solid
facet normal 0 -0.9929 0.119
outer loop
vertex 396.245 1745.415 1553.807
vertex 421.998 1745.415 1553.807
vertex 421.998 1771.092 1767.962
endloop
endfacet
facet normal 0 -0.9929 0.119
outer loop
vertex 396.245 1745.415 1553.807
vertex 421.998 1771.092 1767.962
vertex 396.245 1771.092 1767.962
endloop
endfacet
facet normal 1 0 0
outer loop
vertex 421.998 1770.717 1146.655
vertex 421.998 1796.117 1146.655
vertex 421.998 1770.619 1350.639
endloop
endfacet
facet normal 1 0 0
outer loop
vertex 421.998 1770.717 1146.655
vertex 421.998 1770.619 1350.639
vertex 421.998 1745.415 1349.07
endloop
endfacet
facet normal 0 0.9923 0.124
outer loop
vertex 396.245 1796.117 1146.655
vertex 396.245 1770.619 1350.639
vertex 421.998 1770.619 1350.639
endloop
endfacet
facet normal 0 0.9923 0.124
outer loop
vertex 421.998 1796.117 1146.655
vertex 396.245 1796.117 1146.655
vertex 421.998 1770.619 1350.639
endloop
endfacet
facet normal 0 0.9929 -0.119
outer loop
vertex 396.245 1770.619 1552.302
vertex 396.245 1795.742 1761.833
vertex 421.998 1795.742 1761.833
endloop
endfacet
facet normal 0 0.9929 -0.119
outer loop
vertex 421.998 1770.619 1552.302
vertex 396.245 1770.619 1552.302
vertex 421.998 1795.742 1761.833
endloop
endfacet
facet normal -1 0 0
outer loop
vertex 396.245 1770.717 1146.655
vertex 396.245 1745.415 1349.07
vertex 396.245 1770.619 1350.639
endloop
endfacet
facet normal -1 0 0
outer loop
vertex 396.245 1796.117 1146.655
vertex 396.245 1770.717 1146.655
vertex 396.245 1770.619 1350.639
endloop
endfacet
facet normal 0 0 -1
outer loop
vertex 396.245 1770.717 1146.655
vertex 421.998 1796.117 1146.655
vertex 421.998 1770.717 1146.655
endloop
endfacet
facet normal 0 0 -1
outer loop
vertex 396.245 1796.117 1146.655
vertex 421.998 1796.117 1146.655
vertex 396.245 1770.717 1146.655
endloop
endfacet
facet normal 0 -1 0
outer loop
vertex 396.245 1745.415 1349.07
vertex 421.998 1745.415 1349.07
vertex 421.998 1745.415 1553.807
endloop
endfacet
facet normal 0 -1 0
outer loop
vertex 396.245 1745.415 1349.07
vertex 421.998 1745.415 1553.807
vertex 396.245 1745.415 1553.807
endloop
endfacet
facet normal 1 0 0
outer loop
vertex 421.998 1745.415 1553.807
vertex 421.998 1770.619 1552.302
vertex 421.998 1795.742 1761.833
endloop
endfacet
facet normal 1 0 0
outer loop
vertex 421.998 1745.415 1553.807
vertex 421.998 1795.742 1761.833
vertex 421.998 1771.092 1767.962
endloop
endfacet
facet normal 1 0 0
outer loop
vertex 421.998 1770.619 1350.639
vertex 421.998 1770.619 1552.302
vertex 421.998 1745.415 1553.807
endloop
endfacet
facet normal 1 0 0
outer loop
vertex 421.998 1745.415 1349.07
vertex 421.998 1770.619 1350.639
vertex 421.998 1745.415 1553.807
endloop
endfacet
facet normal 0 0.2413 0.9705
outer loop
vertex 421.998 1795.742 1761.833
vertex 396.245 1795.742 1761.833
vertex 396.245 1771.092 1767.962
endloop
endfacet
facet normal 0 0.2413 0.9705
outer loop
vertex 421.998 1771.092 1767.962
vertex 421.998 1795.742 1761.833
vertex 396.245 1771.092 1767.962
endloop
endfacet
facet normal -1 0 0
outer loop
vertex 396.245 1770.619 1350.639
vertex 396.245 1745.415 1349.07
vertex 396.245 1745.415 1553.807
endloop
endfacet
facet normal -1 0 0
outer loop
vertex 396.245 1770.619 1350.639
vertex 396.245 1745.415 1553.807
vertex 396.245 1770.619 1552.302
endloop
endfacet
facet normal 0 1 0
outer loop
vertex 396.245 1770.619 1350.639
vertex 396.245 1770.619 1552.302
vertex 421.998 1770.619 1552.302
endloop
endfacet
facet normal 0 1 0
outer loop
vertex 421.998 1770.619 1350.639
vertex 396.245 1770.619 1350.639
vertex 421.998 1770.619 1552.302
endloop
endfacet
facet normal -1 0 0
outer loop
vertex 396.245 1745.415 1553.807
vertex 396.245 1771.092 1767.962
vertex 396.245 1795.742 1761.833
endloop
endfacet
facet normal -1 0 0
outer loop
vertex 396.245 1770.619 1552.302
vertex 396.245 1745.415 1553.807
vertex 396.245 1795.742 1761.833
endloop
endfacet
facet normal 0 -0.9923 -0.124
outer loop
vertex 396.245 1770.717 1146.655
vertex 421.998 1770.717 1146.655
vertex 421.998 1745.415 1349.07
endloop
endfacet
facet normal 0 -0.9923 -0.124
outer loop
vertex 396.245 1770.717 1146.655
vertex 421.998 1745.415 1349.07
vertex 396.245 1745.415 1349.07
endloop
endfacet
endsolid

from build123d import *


with BuildPart() as part:
    # Sweep1: sweep along a curve in space
    with BuildLine() as sweep1_path:
        Line((409.121226164, 1758.017106037, 1349.85455637), (409.121226164, 1783.417106037, 1146.65455637))
        Line((409.121226164, 1758.017106037, 1349.85455637), (409.121226164, 1758.017106037, 1553.05455637))
        Line((409.121226164, 1758.017106037, 1553.05455637), (409.121226164, 1783.417106037, 1764.897256503))
    # 3DSketch2 → Sweep1 (sweep)
    with BuildSketch(Plane(origin=(396.244700962, 1770.717106037, 1146.65455637), x_dir=(0.7119701649816974, 0.7022097152389267, -7.366387974552788e-14), z_dir=(0, 0, -1))):
        Polygon((0, 0), (18.335403545, 18.084042191), (36.171530312, 0), (17.836126767, -18.084042191), align=None)
    sweep(path=sweep1_path.line, transition=Transition.RIGHT)


solid = part.part
